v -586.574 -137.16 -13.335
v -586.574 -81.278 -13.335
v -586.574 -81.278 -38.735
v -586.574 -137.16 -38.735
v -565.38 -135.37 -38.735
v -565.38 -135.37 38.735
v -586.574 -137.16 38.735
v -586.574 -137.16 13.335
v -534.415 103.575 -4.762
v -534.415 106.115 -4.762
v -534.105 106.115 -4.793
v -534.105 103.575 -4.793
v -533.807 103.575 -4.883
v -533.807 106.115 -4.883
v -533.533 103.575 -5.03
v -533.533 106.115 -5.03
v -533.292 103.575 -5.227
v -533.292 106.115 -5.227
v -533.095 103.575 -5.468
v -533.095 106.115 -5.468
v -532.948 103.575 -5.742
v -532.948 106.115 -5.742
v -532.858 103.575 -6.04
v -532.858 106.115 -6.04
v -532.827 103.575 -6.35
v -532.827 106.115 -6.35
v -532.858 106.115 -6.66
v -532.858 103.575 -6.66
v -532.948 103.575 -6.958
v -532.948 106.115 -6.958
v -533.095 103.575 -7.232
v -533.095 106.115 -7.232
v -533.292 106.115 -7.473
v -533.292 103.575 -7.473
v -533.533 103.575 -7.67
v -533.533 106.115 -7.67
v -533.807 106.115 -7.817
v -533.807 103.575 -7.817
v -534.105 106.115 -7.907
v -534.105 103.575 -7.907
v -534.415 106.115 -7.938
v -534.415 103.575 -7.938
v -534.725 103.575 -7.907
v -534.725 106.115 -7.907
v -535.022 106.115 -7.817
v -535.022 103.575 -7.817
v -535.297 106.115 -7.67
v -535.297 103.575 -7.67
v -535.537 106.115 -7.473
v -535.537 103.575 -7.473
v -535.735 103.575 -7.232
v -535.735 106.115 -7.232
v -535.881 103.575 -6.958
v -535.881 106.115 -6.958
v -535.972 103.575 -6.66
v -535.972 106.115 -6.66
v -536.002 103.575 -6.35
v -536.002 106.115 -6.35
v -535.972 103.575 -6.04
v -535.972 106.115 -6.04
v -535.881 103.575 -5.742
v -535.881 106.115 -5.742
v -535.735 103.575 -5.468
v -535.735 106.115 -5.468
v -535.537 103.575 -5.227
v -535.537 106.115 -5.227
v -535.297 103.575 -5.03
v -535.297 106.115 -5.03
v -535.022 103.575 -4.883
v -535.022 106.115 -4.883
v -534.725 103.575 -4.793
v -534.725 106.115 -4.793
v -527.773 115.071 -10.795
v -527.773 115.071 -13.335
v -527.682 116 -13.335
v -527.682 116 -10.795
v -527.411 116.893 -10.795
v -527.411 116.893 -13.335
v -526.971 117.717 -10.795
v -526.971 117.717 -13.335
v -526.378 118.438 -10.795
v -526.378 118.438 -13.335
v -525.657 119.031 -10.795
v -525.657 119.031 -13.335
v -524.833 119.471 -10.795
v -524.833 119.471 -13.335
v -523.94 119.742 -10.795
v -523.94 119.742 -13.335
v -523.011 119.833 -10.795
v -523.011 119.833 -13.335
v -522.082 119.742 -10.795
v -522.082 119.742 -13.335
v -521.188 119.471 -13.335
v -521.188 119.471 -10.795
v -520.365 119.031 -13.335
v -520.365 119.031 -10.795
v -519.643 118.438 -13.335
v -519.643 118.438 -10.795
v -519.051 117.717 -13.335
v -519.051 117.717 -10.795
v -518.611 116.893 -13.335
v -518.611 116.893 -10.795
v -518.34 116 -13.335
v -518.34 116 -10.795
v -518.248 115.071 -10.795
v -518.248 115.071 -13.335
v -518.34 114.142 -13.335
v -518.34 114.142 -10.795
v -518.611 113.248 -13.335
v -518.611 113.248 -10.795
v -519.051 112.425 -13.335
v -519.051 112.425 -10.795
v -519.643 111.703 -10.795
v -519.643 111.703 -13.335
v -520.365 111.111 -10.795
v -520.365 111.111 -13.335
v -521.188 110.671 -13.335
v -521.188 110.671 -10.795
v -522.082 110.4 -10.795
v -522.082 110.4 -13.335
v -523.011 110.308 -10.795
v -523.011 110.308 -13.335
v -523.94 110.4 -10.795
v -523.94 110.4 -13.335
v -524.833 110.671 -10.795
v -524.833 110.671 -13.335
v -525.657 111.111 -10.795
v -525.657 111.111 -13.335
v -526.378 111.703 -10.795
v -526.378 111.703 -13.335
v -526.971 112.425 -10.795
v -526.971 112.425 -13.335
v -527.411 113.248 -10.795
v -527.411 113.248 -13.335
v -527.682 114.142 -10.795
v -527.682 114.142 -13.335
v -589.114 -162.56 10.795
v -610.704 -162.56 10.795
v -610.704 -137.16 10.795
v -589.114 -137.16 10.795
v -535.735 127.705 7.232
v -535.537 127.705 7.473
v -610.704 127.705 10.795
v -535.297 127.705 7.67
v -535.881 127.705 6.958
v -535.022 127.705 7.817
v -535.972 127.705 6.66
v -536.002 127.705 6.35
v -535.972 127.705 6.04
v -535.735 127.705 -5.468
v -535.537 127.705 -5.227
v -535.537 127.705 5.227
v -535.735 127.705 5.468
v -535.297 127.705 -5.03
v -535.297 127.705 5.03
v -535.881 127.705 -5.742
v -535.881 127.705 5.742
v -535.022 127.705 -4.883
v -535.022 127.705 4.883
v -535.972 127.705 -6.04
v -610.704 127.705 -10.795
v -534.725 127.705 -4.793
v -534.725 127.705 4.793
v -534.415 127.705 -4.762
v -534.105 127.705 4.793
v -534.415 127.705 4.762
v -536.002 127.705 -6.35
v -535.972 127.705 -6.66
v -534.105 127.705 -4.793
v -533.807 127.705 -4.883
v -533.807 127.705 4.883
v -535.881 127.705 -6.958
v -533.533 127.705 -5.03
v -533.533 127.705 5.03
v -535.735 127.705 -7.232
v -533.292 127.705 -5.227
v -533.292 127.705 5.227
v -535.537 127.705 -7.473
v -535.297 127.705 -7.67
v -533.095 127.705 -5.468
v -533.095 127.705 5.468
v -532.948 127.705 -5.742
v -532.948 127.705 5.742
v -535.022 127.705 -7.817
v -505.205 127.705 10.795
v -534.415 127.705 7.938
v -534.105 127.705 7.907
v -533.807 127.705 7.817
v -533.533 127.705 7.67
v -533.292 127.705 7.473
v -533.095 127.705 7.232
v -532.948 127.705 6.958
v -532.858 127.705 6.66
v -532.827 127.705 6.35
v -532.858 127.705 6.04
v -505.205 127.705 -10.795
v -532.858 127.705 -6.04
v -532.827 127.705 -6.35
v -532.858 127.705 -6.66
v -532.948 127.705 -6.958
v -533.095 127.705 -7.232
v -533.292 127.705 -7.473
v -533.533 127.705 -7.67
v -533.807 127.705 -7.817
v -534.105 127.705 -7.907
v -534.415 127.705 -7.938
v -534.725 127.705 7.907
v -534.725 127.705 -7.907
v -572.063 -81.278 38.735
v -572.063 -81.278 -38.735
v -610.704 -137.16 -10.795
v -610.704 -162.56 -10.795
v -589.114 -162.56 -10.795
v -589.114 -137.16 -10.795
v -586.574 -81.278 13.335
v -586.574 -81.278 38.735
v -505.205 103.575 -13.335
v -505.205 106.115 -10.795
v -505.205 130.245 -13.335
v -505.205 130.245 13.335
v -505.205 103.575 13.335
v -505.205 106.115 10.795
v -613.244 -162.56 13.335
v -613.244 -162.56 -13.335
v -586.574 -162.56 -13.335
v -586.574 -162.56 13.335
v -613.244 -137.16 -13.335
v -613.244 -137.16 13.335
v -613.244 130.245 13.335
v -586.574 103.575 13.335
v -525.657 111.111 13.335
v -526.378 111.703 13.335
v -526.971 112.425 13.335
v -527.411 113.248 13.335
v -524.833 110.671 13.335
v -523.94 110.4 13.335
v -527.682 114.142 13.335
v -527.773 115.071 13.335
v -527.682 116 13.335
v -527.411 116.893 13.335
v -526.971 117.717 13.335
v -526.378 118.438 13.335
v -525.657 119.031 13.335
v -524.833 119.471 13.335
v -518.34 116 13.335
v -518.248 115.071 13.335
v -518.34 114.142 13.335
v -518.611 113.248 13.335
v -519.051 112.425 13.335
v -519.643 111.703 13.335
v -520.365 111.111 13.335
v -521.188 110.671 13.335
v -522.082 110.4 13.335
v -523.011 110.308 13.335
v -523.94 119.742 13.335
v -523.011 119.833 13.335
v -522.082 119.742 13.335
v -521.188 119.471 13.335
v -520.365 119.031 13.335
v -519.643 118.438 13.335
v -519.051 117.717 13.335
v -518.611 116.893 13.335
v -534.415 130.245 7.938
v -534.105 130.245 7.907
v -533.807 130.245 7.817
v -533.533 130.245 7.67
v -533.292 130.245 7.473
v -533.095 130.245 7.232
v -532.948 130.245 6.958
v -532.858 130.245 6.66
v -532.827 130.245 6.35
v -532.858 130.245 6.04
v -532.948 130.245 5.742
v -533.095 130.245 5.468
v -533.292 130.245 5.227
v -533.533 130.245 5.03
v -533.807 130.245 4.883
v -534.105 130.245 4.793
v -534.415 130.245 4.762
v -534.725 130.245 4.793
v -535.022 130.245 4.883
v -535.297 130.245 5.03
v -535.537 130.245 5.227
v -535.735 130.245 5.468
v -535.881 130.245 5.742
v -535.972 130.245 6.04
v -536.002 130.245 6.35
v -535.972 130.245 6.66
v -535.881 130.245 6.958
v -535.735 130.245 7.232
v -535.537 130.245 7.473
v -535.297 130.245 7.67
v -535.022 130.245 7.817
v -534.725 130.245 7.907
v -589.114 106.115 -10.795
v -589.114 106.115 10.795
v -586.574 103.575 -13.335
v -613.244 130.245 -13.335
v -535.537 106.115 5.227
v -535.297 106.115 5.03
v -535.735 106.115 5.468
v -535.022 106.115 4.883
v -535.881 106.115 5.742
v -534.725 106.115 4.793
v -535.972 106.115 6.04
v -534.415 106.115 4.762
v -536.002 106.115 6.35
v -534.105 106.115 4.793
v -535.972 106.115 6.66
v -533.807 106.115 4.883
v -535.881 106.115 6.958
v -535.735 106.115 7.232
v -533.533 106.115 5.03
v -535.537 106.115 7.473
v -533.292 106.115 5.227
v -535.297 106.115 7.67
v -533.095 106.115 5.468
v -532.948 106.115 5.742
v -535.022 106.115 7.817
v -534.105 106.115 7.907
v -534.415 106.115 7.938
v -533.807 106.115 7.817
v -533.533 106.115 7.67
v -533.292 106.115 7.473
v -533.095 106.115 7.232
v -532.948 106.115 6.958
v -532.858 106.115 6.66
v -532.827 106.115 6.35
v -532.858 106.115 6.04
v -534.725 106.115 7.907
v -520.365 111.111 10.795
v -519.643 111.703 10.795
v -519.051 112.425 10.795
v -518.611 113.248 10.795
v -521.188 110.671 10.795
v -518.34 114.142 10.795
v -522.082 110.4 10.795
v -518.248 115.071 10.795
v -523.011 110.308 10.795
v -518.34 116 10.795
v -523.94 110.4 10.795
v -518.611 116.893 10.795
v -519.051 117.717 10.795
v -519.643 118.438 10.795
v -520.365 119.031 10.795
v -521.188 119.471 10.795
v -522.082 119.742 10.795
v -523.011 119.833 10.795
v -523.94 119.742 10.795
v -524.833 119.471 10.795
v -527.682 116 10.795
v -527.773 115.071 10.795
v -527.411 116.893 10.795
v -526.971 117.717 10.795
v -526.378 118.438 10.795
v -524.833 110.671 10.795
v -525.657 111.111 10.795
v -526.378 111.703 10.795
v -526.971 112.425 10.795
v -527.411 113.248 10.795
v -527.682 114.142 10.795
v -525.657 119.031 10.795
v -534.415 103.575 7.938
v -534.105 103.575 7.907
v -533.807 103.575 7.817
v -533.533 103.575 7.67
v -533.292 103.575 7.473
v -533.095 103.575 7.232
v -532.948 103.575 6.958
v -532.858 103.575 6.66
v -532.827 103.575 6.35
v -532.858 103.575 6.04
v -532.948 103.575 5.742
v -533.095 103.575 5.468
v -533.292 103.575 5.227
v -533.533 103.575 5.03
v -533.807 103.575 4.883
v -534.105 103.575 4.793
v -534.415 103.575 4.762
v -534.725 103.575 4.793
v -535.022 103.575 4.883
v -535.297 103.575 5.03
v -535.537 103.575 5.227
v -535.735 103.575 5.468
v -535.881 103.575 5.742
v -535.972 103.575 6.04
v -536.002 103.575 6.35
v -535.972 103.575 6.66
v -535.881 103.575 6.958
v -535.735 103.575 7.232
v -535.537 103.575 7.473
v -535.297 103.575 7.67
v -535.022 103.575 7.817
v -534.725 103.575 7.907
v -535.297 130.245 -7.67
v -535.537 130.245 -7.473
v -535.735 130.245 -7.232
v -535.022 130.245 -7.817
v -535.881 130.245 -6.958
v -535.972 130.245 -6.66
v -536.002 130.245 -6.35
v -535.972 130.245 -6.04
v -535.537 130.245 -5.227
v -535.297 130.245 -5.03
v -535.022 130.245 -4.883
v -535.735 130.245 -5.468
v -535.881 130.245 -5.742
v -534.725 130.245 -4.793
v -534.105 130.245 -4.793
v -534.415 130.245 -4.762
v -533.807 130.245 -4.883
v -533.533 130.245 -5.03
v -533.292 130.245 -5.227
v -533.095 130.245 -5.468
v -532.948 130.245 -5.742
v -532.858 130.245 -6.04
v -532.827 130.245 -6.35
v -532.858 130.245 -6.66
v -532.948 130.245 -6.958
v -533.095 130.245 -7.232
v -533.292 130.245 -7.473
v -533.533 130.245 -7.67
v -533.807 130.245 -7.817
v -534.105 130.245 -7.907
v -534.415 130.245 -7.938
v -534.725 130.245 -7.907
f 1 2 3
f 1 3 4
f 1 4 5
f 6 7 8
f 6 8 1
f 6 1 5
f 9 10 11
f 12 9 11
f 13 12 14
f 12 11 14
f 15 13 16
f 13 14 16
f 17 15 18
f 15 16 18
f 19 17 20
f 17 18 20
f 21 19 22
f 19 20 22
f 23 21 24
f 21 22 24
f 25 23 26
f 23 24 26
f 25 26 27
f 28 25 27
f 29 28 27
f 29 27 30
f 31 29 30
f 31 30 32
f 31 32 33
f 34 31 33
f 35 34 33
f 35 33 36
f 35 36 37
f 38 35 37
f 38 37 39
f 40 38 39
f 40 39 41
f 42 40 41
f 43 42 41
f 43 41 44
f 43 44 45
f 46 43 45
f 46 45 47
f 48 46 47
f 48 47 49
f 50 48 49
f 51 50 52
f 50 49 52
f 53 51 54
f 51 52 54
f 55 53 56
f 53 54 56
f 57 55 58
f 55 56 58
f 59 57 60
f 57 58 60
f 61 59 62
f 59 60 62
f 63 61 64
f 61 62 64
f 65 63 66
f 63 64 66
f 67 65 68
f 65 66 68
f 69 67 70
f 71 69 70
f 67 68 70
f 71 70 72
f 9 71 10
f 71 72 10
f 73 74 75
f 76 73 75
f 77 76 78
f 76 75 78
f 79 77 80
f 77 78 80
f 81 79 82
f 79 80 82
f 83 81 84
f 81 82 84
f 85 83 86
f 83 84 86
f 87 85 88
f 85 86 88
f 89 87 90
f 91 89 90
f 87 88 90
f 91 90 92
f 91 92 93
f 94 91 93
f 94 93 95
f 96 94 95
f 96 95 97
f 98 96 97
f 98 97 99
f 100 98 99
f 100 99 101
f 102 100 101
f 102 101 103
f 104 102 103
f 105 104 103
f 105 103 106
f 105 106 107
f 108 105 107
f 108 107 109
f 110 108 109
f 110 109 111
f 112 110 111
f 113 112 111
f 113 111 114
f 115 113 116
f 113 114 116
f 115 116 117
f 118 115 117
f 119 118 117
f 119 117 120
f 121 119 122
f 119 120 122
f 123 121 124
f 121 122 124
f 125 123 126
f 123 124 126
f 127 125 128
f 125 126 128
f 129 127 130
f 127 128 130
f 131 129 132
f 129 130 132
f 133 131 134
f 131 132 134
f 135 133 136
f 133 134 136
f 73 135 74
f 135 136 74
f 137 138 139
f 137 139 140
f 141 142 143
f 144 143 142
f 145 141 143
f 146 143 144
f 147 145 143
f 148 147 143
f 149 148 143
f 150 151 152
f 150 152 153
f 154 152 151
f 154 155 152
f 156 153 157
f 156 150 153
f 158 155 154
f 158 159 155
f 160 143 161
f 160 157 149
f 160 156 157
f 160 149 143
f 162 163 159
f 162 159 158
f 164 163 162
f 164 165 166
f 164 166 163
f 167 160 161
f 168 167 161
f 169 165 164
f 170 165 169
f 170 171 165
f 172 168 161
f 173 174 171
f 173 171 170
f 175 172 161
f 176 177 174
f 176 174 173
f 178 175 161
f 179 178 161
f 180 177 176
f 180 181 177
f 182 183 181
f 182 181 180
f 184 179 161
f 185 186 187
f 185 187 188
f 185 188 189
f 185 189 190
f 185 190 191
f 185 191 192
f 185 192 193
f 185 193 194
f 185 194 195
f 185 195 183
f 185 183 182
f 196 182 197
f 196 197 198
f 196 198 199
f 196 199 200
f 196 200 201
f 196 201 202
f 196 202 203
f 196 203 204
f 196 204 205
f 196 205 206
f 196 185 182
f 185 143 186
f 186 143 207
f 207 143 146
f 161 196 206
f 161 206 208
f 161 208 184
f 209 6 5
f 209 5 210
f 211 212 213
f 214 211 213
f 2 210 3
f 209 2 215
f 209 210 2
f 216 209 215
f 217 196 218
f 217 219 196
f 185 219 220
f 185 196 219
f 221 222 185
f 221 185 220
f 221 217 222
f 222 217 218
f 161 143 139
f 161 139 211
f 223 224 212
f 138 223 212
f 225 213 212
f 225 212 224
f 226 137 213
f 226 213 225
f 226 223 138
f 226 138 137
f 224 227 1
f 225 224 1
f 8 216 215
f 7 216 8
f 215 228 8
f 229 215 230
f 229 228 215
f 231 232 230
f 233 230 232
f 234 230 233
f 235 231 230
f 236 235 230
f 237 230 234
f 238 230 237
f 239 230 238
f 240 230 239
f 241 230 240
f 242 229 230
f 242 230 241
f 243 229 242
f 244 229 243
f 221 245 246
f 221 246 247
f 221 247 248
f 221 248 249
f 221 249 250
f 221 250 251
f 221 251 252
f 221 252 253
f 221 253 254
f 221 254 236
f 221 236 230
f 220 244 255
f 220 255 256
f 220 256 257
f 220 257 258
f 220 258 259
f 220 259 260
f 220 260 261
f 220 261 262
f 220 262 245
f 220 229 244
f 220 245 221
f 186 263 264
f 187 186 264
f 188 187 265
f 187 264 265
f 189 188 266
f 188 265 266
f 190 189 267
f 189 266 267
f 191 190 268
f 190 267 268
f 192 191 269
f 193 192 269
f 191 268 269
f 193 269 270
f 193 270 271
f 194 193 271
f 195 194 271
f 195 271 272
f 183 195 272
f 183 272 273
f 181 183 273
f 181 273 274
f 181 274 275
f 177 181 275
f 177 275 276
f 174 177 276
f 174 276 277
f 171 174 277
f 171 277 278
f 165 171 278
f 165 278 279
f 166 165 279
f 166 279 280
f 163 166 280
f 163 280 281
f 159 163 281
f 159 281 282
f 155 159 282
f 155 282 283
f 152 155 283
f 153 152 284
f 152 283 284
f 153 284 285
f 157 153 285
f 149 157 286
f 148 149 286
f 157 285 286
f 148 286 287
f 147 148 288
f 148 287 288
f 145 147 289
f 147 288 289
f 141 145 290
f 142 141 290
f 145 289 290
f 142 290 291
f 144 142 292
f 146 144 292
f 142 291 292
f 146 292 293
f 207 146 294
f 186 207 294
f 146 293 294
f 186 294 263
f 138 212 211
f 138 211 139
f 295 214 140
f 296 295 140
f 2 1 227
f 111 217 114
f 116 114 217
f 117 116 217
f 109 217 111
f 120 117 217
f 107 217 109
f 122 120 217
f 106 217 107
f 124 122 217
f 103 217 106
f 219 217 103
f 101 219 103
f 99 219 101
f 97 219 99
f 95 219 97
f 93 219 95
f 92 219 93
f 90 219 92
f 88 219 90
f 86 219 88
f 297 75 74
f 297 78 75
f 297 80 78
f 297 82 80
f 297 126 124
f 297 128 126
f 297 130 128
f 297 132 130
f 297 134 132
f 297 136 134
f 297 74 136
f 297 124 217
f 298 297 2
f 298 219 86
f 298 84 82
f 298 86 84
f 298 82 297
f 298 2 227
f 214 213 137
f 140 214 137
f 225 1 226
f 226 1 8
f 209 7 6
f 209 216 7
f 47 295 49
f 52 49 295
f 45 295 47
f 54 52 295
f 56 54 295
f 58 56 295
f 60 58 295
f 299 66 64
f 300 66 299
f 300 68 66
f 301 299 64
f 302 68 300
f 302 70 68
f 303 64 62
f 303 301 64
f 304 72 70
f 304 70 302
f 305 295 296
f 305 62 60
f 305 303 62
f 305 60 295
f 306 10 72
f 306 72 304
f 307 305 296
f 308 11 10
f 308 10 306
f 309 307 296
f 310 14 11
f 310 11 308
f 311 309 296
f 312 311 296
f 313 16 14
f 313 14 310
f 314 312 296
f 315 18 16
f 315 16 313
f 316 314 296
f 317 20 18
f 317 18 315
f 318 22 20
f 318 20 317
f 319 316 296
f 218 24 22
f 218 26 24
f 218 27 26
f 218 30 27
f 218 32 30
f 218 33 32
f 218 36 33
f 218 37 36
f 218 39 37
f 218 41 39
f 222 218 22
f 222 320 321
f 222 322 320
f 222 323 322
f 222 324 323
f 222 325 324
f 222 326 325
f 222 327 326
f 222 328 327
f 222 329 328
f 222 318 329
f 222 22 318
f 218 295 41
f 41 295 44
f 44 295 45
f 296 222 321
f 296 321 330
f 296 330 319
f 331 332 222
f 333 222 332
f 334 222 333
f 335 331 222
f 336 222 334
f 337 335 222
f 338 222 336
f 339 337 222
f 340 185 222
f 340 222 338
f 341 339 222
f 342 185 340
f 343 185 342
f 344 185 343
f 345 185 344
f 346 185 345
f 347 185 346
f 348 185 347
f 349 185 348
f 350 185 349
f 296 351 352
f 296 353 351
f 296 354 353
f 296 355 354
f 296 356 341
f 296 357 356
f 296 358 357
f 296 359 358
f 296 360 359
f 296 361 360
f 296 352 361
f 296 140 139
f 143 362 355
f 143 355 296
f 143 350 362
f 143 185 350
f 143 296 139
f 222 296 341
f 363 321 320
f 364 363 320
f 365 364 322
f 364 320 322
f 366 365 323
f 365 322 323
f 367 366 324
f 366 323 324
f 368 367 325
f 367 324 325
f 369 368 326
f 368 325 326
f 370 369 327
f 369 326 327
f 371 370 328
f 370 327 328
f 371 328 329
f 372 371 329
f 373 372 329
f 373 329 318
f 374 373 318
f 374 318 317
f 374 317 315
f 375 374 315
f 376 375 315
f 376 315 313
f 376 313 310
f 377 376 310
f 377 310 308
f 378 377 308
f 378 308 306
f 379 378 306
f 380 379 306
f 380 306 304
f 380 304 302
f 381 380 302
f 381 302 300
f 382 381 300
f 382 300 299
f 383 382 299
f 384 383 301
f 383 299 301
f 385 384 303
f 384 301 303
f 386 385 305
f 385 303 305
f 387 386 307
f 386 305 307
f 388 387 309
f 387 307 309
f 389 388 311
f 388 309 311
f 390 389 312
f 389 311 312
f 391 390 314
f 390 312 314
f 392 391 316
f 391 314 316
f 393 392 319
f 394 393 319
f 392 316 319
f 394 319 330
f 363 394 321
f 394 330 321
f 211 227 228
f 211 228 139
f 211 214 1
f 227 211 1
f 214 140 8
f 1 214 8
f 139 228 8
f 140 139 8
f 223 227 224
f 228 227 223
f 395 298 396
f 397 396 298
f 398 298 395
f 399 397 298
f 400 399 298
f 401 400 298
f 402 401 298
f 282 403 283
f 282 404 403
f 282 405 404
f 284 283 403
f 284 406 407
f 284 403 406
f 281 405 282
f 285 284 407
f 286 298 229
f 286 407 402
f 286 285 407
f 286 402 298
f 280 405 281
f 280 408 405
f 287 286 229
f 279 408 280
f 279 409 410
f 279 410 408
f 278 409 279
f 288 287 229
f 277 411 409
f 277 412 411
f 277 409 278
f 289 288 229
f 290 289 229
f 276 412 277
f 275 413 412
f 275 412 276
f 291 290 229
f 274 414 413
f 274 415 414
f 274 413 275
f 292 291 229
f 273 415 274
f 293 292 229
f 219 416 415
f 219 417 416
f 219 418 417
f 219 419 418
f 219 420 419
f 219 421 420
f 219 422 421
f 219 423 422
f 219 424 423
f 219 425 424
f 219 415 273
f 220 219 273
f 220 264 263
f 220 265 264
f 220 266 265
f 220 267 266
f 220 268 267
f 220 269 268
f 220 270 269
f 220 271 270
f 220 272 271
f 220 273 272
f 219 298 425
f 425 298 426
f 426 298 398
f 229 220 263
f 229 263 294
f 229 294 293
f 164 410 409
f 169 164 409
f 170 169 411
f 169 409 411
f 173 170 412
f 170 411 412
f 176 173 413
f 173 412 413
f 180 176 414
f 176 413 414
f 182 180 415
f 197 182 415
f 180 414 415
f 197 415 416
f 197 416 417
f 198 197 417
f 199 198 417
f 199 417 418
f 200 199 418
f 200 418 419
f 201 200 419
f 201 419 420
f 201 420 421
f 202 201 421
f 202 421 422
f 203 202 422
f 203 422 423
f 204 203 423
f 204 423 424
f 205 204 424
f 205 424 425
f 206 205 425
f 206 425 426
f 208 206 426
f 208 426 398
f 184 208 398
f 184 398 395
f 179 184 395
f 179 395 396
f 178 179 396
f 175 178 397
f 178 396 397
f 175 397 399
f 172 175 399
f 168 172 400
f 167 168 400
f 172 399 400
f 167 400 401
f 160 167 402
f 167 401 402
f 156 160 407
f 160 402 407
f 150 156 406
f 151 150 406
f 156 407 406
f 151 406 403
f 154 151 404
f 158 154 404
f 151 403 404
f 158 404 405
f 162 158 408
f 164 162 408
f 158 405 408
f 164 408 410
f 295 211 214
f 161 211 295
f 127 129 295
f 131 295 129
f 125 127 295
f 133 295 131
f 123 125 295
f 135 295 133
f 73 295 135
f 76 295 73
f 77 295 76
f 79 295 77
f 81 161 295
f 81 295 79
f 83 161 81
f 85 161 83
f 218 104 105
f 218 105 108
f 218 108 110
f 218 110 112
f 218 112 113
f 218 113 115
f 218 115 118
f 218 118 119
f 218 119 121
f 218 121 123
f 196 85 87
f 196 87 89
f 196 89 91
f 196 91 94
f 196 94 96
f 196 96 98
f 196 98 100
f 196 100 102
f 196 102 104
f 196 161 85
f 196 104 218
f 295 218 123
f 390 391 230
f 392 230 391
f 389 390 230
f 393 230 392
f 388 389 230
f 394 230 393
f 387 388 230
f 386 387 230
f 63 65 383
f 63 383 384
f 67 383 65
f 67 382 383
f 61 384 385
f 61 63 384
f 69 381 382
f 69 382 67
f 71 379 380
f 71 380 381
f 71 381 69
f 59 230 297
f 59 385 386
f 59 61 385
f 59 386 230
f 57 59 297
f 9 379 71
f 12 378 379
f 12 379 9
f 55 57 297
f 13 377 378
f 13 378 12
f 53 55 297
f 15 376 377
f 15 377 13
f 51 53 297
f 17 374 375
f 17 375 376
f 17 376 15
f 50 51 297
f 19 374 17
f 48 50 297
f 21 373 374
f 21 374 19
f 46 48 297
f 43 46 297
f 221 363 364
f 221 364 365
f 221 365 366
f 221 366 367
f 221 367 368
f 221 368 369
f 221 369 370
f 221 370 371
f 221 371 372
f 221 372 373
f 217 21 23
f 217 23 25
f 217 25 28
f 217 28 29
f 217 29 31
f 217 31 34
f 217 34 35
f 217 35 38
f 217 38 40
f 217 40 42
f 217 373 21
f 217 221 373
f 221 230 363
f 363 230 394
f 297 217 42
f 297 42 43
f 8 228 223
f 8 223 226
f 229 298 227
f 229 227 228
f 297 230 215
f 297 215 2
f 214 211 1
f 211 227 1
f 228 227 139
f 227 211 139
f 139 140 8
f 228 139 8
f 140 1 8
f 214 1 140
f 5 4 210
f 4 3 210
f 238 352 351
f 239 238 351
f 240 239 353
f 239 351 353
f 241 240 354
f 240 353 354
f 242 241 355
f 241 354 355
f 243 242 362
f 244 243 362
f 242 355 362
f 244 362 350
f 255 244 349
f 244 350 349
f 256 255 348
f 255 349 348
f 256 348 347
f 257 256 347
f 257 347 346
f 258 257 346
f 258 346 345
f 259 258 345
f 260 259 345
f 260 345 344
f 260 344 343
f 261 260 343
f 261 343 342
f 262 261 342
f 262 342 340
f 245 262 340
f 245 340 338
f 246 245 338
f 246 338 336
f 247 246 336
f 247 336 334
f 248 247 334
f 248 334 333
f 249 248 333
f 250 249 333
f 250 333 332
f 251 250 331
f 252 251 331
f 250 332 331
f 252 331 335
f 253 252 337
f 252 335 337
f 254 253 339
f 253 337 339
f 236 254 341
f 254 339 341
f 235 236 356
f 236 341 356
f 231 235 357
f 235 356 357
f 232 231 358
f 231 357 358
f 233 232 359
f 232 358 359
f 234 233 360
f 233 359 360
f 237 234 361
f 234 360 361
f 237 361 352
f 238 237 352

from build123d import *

# Parameters (mm, degrees)
SKETCH3_W                = 26.67
SKETCH3_H                = 26.67
SKETCH3_W_2              = 21.59
SKETCH3_H_2              = 21.59
BOSS_EXTRUDE1_DEPTH      = 25.4
BOSS_EXTRUDE1_DEPTH_BACK = 52.07
SKETCH8_W                = 26.67
SKETCH8_H                = 26.67
SKETCH8_W_2              = 21.59
SKETCH8_H_2              = 21.59
BOSS_EXTRUDE2_DEPTH      = 25.4
SKETCH9_R                = 4.7625
CUT_EXTRUDE1_DEPTH       = 637.557260443
SKETCH10_R               = 1.5875
CUT_EXTRUDE2_DEPTH       = 681.663834945


with BuildPart() as part:
    # Sweep1: sweep along a path in Sketch1
    with BuildLine(Plane.XY) as sweep1_path:
        Line((-598.06984839, -137.16), (-598.06984839, 115.070893757))
        Line((-598.06984839, 115.070893757), (-505.204841138, 115.070893757))
    # Sketch3 → Sweep1 (sweep)
    with BuildSketch(Plane(origin=(0, -137.16, 0), x_dir=(-1, 0, 0), z_dir=(0, 1, 0))):
        with Locations((599.908921554, 0)):
            Rectangle(SKETCH3_W, SKETCH3_H)
        with Locations((599.908921554, 0)):
            Rectangle(SKETCH3_W_2, SKETCH3_H_2, mode=Mode.SUBTRACT)
    sweep(path=sweep1_path.line, transition=Transition.RIGHT)

    # Sketch7 → Boss-Extrude1 (add, two sides: drawn at the far end of the back side and taken through both)
    with BuildSketch(Plane(origin=(0, 0, -13.335), x_dir=(-1, 0, 0), z_dir=(0, 0, -1)).offset(-BOSS_EXTRUDE1_DEPTH_BACK)):
        Polygon((586.573921554, -137.16), (565.380149791, -135.369703544), (572.062710026, -81.27839133), (586.573921554, -81.27839133), align=None)
    extrude(amount=BOSS_EXTRUDE1_DEPTH + BOSS_EXTRUDE1_DEPTH_BACK)

    # Sketch9 → Cut-Extrude1 (cut, through all)
    with BuildSketch(Plane(origin=(0, 0, -13.335), x_dir=(-1, 0, 0), z_dir=(0, 0, -1))):
        with Locations((523.010694713, 115.070893757)):
            Circle(SKETCH9_R)
    extrude(amount=-CUT_EXTRUDE1_DEPTH, mode=Mode.SUBTRACT)

    # Sketch10 → Cut-Extrude2 (cut, through all)
    with BuildSketch(Plane(origin=(0, 130.244966921, 0), x_dir=(1, 0, 0), z_dir=(0, 1, 0))):
        with Locations(Location((-534.414841138, 6.35, 0), (0, 0, 270))):
            Circle(SKETCH10_R)
        with Locations(Location((-534.414841138, -6.35, 0), (0, 0, 270))):
            Circle(SKETCH10_R)
    extrude(amount=-CUT_EXTRUDE2_DEPTH, mode=Mode.SUBTRACT)


with BuildPart() as body_2:
    # Sketch8 → Boss-Extrude2 (new body)
    with BuildSketch(Plane.XZ.offset(137.16)):
        with Locations((-599.908921554, 0)):
            Rectangle(SKETCH8_W, SKETCH8_H)
        with Locations((-599.908921554, 0)):
            Rectangle(SKETCH8_W_2, SKETCH8_H_2, mode=Mode.SUBTRACT)
    extrude(amount=BOSS_EXTRUDE2_DEPTH)


solid = Compound([part.part, body_2.part])
